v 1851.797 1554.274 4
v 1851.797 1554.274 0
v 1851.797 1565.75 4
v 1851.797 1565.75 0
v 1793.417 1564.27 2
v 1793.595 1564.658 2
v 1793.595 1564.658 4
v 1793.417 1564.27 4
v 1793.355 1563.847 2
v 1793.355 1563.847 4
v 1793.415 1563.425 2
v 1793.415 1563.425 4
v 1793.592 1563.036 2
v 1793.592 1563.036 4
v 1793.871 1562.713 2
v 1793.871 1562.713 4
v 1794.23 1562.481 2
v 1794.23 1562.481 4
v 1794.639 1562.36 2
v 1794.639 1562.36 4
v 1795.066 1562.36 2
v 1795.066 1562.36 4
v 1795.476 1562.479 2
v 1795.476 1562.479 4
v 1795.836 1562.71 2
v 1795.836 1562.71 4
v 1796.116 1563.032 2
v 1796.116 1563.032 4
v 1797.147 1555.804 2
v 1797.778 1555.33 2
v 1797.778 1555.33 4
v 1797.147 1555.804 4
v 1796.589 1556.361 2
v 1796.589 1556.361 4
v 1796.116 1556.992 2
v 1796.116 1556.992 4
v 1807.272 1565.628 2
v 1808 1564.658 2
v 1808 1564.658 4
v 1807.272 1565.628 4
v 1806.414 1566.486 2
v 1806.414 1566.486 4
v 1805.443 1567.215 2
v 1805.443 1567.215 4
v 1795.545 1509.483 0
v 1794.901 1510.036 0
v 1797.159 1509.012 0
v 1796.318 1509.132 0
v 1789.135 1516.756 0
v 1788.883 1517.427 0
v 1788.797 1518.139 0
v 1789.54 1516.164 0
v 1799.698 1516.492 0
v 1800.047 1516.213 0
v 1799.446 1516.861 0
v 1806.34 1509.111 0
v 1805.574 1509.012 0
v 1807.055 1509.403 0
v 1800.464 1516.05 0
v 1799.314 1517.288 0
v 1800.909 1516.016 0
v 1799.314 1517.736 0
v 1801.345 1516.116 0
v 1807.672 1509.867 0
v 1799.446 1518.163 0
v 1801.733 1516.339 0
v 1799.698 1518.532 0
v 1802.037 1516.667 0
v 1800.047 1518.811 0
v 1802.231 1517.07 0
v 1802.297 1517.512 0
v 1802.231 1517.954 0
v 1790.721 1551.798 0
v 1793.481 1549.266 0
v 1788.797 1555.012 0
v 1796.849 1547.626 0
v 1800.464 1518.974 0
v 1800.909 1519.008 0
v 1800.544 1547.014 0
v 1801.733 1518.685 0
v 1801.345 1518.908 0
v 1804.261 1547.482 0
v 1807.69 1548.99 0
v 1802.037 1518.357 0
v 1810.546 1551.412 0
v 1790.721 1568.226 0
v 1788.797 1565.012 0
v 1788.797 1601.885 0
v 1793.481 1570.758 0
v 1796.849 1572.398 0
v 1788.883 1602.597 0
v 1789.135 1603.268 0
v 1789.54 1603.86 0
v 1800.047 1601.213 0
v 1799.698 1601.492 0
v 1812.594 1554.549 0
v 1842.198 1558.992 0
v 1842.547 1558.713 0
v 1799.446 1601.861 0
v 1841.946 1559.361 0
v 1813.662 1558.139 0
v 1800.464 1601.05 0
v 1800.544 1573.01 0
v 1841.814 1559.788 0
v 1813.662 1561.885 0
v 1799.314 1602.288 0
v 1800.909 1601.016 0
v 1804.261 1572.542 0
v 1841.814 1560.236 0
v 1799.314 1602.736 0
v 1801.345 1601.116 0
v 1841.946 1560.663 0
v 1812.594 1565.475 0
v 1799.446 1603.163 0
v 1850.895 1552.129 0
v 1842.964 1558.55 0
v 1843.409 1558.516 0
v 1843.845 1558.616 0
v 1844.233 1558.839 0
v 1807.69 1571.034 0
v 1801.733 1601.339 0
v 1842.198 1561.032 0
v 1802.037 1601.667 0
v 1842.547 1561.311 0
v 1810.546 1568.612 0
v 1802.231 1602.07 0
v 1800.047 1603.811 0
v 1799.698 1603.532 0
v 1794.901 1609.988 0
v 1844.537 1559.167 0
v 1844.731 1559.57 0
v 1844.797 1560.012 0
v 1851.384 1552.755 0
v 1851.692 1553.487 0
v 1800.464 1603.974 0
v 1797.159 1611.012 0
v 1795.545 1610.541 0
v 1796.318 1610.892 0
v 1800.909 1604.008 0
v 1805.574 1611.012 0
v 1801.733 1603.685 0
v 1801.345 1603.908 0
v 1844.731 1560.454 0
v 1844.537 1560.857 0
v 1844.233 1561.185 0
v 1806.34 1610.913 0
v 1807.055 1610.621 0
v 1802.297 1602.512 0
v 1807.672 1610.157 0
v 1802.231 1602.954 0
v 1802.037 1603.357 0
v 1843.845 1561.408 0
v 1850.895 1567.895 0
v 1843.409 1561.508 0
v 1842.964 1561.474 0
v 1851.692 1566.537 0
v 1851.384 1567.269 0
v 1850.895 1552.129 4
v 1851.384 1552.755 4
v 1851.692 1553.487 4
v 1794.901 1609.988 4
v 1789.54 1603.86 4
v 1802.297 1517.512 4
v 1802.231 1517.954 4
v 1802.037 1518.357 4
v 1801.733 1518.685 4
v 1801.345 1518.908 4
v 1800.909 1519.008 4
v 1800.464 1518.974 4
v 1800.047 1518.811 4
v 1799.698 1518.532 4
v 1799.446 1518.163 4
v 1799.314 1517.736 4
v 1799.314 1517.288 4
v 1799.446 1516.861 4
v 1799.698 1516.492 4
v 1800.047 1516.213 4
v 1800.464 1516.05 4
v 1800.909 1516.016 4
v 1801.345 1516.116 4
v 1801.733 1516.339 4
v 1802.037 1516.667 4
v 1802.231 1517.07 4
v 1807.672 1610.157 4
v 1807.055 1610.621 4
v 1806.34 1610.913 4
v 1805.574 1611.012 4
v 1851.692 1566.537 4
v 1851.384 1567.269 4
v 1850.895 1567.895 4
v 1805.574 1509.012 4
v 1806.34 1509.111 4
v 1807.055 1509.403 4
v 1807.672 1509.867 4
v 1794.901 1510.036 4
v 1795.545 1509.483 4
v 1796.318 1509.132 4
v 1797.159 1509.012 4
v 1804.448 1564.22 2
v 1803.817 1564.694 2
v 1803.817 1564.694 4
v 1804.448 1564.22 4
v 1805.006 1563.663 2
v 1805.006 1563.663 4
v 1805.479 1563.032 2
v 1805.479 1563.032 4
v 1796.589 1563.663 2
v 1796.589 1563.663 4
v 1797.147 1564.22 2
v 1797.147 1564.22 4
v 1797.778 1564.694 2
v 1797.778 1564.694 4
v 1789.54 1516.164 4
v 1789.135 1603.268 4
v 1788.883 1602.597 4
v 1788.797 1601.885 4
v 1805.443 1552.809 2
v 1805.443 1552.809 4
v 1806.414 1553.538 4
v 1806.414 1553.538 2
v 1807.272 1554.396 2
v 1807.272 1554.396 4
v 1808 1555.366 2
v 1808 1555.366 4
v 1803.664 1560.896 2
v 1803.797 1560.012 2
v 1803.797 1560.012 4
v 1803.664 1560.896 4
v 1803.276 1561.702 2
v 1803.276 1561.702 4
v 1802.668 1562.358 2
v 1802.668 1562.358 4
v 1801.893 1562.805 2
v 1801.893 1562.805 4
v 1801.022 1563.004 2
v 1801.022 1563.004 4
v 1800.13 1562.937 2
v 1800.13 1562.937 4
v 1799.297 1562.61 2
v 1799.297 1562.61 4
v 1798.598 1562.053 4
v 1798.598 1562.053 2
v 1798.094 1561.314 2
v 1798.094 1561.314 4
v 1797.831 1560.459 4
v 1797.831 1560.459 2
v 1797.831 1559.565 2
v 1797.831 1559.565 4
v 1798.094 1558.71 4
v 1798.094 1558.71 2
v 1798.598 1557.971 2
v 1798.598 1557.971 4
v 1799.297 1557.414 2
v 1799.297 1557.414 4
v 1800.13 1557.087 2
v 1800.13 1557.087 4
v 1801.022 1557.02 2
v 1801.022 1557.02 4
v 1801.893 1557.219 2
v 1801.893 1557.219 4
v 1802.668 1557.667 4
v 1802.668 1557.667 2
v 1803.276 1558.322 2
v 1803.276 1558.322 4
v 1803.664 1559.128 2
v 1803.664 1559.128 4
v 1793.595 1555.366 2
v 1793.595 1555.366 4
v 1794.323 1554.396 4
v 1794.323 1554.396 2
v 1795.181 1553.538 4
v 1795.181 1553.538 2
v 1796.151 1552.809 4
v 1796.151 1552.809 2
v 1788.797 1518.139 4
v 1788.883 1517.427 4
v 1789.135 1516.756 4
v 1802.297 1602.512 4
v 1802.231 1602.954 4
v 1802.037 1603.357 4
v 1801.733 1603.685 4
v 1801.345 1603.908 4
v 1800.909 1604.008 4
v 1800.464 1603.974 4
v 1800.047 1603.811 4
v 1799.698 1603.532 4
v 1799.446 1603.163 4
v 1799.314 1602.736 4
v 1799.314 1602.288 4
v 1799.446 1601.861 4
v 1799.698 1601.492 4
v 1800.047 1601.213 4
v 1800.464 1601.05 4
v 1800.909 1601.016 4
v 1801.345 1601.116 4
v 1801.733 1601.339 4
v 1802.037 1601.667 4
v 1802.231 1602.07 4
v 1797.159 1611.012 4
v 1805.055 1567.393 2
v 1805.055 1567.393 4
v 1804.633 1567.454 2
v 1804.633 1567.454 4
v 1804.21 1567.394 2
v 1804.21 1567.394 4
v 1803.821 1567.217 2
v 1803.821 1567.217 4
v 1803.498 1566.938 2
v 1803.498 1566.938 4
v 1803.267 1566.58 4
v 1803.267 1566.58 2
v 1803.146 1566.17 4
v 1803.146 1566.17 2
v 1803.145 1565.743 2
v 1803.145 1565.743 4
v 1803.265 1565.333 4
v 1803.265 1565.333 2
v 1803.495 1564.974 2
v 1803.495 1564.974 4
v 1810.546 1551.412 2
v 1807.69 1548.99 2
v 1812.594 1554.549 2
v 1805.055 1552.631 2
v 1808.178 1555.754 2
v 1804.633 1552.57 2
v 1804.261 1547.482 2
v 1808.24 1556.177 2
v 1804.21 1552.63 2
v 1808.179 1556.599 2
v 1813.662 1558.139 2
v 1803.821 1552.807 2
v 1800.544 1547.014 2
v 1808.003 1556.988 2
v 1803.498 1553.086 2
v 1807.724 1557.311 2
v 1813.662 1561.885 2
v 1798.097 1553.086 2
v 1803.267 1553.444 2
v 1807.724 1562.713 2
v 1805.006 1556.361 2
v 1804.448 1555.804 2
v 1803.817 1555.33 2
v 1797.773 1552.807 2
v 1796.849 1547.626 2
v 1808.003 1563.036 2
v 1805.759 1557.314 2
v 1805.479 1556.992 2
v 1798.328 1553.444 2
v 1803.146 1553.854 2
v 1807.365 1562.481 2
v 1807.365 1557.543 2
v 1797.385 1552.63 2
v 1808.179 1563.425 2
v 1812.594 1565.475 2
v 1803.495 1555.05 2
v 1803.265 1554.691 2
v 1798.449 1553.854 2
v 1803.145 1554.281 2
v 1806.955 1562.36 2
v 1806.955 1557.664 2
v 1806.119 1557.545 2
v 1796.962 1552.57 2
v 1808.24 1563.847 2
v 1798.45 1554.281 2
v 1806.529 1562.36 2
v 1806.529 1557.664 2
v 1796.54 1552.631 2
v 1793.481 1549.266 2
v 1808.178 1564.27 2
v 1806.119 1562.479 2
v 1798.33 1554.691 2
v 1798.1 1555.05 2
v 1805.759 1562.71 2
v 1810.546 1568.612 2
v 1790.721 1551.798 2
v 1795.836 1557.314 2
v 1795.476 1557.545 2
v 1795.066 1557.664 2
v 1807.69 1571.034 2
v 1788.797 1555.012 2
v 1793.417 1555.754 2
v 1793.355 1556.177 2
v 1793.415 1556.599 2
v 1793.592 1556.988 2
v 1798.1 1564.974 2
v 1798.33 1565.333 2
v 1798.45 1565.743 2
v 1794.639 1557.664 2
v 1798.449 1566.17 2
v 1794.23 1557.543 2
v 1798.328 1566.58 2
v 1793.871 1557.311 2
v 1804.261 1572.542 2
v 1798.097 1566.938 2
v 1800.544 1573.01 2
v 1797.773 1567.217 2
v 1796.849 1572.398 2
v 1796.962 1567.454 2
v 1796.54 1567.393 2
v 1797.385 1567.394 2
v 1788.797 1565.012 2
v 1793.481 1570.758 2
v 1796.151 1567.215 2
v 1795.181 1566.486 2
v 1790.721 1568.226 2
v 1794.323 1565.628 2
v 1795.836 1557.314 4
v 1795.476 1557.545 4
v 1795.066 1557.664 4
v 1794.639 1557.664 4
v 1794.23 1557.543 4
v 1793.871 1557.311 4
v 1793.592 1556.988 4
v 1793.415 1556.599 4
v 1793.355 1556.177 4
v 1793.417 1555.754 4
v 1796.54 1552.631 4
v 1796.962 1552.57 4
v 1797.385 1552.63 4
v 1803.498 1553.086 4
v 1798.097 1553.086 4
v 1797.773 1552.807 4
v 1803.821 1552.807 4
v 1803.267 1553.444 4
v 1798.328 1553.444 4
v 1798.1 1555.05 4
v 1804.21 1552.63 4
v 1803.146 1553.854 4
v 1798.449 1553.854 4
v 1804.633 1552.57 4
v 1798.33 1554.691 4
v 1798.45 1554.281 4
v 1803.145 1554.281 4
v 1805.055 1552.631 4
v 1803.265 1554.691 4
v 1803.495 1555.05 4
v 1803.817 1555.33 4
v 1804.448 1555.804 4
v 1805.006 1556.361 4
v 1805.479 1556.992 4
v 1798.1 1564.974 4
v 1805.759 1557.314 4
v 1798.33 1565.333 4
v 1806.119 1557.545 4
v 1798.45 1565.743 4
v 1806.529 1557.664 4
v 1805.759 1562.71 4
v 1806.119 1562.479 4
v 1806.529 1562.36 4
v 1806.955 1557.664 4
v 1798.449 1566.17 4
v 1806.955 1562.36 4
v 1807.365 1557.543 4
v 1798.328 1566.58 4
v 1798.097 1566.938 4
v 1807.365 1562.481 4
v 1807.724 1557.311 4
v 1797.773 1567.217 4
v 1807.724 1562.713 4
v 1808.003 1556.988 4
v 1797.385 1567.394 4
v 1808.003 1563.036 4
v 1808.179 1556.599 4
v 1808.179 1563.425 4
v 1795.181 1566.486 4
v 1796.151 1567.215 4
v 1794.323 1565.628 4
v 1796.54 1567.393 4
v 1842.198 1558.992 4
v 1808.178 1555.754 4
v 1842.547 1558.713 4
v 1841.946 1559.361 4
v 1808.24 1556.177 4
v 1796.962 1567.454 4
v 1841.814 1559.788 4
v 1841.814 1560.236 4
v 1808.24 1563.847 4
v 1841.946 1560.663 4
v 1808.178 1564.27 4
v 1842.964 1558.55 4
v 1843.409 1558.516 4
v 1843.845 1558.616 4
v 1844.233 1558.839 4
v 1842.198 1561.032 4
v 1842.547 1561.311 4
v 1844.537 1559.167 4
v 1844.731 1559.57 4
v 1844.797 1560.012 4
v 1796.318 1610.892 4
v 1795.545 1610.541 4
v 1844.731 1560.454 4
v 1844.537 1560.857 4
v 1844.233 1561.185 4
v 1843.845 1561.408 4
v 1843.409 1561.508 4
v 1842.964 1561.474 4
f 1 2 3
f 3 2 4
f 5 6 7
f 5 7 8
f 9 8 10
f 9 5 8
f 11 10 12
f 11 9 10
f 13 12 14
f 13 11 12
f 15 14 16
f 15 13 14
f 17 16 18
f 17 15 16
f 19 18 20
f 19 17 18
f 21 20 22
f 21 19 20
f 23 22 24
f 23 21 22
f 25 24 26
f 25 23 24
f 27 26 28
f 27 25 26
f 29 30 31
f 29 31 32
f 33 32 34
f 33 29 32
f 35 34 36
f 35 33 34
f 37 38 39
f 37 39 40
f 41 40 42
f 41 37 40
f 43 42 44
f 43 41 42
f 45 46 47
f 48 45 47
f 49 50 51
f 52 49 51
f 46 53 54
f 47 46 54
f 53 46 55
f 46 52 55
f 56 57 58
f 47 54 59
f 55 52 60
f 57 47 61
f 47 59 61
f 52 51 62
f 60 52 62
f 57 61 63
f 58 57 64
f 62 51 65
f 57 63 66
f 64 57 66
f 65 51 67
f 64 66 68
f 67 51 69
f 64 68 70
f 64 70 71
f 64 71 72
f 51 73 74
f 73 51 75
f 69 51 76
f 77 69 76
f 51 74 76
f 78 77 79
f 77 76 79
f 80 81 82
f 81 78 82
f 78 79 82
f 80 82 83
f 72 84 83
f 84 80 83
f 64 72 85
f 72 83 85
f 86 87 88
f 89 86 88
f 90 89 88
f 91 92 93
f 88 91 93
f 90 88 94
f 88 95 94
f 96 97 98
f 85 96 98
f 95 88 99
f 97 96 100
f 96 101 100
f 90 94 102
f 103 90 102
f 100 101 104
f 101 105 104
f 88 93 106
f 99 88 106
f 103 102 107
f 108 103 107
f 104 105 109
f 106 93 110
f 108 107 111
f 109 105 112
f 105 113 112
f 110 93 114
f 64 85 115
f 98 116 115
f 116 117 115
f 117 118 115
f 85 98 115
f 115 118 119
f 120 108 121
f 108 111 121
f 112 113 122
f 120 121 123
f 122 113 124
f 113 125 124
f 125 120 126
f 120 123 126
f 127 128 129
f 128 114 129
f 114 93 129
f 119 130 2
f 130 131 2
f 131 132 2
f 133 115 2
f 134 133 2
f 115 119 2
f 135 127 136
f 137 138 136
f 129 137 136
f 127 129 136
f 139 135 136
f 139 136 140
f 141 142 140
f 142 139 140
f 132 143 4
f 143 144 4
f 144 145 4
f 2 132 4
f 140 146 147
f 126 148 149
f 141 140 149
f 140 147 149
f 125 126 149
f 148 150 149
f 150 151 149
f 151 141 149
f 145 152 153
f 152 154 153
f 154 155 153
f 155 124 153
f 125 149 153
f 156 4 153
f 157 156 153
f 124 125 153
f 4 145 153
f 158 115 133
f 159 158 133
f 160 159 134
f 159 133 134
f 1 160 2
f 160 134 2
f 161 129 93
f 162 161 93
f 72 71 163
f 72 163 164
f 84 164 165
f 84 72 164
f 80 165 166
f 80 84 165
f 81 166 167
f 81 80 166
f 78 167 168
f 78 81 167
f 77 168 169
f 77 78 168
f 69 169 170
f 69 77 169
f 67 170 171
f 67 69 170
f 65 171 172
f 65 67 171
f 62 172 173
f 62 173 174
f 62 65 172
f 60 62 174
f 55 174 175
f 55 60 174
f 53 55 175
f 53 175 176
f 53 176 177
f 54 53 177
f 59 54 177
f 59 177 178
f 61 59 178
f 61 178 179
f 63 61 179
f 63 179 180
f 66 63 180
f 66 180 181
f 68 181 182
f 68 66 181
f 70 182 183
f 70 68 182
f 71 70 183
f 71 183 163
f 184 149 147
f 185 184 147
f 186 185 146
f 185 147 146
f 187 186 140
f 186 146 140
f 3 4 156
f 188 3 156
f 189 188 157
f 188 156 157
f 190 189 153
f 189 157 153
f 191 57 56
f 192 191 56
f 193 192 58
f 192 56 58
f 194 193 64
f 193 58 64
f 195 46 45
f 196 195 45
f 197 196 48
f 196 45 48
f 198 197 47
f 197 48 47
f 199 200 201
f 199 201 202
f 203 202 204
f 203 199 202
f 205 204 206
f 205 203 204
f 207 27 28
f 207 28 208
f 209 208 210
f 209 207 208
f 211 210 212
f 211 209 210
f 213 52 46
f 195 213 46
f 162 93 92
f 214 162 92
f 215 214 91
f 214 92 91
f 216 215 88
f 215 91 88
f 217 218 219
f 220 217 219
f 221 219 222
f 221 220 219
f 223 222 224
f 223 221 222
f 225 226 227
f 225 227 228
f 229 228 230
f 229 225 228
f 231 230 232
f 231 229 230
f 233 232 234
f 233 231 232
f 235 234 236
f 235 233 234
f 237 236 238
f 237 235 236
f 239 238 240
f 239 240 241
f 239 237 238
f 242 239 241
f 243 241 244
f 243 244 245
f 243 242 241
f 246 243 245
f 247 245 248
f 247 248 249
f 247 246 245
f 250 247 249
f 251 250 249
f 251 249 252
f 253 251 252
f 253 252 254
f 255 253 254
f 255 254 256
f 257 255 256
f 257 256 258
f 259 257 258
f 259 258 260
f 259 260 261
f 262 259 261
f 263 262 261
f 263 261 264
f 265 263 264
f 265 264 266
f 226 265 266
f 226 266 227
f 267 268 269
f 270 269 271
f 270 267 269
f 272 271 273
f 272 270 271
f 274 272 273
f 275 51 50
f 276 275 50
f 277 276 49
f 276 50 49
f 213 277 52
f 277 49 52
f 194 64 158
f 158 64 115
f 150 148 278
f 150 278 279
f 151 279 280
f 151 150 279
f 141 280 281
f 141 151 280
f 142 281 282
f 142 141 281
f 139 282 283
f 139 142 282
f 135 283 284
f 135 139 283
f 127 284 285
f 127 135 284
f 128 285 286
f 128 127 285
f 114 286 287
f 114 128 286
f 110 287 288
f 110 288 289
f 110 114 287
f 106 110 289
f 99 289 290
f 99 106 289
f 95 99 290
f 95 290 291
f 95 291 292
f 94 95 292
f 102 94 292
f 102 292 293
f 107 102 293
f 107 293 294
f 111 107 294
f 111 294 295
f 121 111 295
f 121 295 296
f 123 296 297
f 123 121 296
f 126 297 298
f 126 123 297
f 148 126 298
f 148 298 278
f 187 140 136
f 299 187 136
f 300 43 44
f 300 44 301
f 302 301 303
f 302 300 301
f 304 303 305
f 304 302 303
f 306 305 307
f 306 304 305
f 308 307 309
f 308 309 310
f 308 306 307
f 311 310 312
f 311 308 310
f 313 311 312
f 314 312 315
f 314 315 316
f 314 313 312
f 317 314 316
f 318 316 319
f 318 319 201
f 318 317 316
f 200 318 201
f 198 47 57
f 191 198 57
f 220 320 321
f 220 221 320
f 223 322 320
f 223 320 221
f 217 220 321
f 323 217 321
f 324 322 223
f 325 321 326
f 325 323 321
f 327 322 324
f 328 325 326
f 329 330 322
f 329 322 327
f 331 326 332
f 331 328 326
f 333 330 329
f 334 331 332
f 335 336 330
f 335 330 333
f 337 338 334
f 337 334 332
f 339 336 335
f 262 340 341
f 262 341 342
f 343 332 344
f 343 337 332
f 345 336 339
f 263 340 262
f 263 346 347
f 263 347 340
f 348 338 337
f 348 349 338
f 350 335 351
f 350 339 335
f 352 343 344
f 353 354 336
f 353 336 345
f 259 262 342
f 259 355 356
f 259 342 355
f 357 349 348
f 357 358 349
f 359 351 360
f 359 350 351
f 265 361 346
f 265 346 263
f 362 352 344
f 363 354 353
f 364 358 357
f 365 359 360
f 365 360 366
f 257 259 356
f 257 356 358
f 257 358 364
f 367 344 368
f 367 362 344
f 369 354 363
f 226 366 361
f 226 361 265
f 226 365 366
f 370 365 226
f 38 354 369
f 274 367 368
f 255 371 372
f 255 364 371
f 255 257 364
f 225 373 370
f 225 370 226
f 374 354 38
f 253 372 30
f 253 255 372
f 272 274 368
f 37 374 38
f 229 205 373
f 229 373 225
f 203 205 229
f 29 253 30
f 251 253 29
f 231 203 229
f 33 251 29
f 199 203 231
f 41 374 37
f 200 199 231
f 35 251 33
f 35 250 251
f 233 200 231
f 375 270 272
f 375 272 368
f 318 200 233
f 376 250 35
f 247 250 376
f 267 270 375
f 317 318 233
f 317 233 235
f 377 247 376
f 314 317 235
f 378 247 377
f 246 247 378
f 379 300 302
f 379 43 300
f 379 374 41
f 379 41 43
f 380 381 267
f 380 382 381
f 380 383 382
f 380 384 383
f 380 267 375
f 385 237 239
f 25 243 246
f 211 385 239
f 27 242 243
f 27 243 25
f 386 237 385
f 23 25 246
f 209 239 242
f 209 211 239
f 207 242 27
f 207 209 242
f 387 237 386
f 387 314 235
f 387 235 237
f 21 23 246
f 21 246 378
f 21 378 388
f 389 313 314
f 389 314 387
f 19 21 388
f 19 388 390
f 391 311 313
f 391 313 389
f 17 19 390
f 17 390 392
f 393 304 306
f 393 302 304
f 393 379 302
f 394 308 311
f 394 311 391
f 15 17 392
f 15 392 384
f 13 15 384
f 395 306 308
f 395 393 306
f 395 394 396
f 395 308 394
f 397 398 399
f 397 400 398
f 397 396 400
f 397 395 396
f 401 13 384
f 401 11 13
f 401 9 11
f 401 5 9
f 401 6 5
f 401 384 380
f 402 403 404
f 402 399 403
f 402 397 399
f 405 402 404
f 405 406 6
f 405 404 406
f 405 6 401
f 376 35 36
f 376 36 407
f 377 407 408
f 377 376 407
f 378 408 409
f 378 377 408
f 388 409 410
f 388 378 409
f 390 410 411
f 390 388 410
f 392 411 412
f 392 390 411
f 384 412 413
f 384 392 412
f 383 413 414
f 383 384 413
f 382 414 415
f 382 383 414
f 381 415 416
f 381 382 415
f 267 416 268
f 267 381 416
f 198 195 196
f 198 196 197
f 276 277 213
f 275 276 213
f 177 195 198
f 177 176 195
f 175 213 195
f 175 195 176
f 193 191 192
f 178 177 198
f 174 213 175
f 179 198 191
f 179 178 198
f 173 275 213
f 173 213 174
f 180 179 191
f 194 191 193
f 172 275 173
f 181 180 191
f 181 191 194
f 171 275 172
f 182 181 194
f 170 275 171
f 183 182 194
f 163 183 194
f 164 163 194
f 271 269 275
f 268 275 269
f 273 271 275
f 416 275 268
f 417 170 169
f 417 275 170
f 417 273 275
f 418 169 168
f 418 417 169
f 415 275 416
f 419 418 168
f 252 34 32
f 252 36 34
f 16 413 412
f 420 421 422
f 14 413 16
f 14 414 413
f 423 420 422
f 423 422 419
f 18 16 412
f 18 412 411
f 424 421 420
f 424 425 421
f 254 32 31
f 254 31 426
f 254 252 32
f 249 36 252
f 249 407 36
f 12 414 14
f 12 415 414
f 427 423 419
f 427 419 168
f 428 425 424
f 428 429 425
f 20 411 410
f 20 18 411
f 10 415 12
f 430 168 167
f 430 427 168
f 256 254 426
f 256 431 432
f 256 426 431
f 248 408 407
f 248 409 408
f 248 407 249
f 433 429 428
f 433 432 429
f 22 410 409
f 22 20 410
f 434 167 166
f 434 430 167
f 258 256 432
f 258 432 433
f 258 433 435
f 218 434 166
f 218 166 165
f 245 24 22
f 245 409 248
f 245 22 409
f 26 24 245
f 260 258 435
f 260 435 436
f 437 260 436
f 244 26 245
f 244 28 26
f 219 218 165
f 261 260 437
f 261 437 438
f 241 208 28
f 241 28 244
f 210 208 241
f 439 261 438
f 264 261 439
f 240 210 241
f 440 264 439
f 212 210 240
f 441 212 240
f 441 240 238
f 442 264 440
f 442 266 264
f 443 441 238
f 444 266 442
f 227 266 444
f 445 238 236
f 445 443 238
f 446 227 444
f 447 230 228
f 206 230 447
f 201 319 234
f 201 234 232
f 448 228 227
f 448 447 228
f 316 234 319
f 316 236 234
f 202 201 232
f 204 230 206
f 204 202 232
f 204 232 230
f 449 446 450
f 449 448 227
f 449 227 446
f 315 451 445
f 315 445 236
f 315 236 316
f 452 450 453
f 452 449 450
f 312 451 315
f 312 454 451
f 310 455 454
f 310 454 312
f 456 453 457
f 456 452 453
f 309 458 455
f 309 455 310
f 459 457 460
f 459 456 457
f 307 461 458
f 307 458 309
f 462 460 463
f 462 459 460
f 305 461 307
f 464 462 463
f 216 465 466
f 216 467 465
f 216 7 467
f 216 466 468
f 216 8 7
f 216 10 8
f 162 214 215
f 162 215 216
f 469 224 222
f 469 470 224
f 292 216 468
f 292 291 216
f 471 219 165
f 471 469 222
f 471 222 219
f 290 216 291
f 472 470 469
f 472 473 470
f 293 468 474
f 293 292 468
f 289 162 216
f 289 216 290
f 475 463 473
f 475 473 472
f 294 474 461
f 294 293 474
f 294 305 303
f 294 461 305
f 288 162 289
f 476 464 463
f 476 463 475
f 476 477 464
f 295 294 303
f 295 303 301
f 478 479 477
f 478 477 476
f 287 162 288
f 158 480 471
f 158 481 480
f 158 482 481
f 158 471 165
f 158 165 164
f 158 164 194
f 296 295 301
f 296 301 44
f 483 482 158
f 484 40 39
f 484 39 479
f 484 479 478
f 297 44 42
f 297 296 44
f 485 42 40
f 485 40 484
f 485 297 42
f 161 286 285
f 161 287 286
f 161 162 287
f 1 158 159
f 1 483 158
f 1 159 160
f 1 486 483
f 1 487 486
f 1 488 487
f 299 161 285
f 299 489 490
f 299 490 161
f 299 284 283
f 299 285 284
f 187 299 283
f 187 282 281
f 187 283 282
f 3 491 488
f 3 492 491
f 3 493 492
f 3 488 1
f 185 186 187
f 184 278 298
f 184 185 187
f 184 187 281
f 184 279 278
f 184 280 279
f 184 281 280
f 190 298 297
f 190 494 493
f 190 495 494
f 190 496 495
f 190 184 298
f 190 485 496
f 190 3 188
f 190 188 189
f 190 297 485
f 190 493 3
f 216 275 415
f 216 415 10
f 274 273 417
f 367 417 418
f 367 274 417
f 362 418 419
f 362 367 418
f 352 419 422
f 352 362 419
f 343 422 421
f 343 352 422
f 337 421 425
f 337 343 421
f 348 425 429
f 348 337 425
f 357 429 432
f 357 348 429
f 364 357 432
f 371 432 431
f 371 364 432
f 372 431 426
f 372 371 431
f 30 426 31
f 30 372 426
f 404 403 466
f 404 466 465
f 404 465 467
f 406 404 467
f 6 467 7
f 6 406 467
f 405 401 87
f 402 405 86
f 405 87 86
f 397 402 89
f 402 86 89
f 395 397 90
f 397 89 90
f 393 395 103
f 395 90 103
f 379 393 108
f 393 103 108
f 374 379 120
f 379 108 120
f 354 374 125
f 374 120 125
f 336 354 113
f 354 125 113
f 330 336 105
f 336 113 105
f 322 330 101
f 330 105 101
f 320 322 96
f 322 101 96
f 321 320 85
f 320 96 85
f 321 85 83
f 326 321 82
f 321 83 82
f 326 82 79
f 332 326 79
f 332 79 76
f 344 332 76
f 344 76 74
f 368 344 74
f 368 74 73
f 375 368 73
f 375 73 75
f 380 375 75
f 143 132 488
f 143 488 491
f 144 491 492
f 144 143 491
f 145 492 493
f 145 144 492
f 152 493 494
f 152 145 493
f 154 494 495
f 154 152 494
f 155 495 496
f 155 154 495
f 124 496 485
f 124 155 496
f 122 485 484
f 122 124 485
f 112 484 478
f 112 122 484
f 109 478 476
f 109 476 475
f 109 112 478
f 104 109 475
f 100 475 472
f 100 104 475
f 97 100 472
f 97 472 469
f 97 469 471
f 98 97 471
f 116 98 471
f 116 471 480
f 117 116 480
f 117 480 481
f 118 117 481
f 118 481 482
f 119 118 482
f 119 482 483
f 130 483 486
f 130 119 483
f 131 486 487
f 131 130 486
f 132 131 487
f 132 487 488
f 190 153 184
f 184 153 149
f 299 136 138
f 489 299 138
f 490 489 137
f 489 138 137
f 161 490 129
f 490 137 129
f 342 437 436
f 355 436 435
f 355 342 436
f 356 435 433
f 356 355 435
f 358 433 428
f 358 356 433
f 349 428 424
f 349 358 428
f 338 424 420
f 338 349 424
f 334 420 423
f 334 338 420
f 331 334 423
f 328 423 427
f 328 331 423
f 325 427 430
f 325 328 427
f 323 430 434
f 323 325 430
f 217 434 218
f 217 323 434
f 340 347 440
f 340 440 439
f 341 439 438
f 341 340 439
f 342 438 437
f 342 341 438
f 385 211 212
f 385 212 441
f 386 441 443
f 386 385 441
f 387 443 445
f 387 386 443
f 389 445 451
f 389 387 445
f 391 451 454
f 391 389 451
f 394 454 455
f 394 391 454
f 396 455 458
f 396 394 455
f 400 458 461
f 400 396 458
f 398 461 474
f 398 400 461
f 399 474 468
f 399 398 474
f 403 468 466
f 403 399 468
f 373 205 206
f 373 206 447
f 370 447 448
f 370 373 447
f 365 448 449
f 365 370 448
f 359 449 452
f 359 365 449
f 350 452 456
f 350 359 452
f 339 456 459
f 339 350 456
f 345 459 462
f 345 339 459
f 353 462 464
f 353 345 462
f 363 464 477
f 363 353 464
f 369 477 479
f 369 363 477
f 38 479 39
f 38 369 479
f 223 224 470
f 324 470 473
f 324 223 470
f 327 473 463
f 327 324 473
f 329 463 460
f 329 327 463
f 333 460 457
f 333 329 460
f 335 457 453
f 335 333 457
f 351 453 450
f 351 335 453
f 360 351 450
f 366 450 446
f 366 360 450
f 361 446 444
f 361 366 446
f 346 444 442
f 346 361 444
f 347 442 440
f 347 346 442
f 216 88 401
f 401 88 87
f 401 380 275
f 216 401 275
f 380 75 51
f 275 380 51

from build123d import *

# Parameters (mm, degrees)
SKETCH_1_R          = 3
SKETCH_1_R_2        = 1.5
EXTRUDE_1_DEPTH     = 4
SKETCH_3_R          = 13
CUT_EXTRUDE_2_DEPTH = 2


with BuildPart() as part:
    # 草图1 → 凸台-拉伸1 (new body)
    with BuildSketch(Plane.XY):
        with BuildLine():
            Line((1789.5396377, 1516.163703518), (1794.90094238, 1510.03649817))
            ThreePointArc((1794.90094238, 1510.03649817), (1795.919023617, 1509.280113251), (1797.158672464, 1509.012011993))
            Line((1797.158672464, 1509.012011993), (1805.574426245, 1509.012011993))
            ThreePointArc((1805.574426245, 1509.012011993), (1806.70688816, 1509.233967715), (1807.671779141, 1509.866991986))
            Line((1807.671779141, 1509.866991986), (1850.89472068, 1552.129423713))
            ThreePointArc((1850.89472068, 1552.129423713), (1851.562513231, 1553.110841273), (1851.797367784, 1554.274443721))
            Line((1851.797367784, 1554.274443721), (1851.797367784, 1565.749580266))
            ThreePointArc((1851.797367784, 1565.749580266), (1851.562513231, 1566.913182714), (1850.89472068, 1567.894600273))
            Line((1850.89472068, 1567.894600273), (1807.671779141, 1610.157032))
            ThreePointArc((1807.671779141, 1610.157032), (1806.70688816, 1610.790056271), (1805.574426245, 1611.012011993))
            Line((1805.574426245, 1611.012011993), (1797.158672464, 1611.012011993))
            ThreePointArc((1797.158672464, 1611.012011993), (1795.919023617, 1610.743910735), (1794.90094238, 1609.987525817))
            Line((1794.90094238, 1609.987525817), (1789.5396377, 1603.860320468))
            ThreePointArc((1789.5396377, 1603.860320468), (1788.989059552, 1602.939986664), (1788.797367784, 1601.884806645))
            Line((1788.797367784, 1601.884806645), (1788.797367784, 1518.139217341))
            ThreePointArc((1788.797367784, 1518.139217341), (1788.989059552, 1517.084037322), (1789.5396377, 1516.163703518))
        make_face()
        with Locations((1800.797367784, 1560.012011993)):
            Circle(SKETCH_1_R, mode=Mode.SUBTRACT)
        with Locations((1800.797367784, 1602.512011993)):
            Circle(SKETCH_1_R_2, mode=Mode.SUBTRACT)
        with Locations((1843.297367784, 1560.012011993)):
            Circle(SKETCH_1_R_2, mode=Mode.SUBTRACT)
        with Locations((1800.797367784, 1517.512011993)):
            Circle(SKETCH_1_R_2, mode=Mode.SUBTRACT)
        with BuildLine():
            ThreePointArc((1805.443255224, 1552.809308797), (1806.858027956, 1553.951351821), (1808.000070981, 1555.366124554))
            ThreePointArc((1808.000070981, 1555.366124554), (1807.55260939, 1557.43971519), (1805.479018754, 1556.992253599))
            ThreePointArc((1805.479018754, 1556.992253599), (1804.736707613, 1556.072672165), (1803.817126178, 1555.330361023))
            ThreePointArc((1803.817126178, 1555.330361023), (1803.369664588, 1553.256770387), (1805.443255224, 1552.809308797))
        make_face(mode=Mode.SUBTRACT)
        with BuildLine():
            ThreePointArc((1808.000070981, 1564.657899433), (1806.858027956, 1566.072672165), (1805.443255224, 1567.21471519))
            ThreePointArc((1805.443255224, 1567.21471519), (1803.369664588, 1566.767253599), (1803.817126178, 1564.693662963))
            ThreePointArc((1803.817126178, 1564.693662963), (1804.736707613, 1563.951351821), (1805.479018754, 1563.031770387))
            ThreePointArc((1805.479018754, 1563.031770387), (1807.55260939, 1562.584308797), (1808.000070981, 1564.657899433))
        make_face(mode=Mode.SUBTRACT)
        with BuildLine():
            ThreePointArc((1796.151480345, 1567.21471519), (1794.736707613, 1566.072672165), (1793.594664588, 1564.657899433))
            ThreePointArc((1793.594664588, 1564.657899433), (1794.042126178, 1562.584308797), (1796.115716814, 1563.031770387))
            ThreePointArc((1796.115716814, 1563.031770387), (1796.858027956, 1563.951351821), (1797.77760939, 1564.693662963))
            ThreePointArc((1797.77760939, 1564.693662963), (1798.225070981, 1566.767253599), (1796.151480345, 1567.21471519))
        make_face(mode=Mode.SUBTRACT)
        with BuildLine():
            ThreePointArc((1793.594664588, 1555.366124554), (1794.736707613, 1553.951351821), (1796.151480345, 1552.809308797))
            ThreePointArc((1796.151480345, 1552.809308797), (1798.225070981, 1553.256770387), (1797.77760939, 1555.330361023))
            ThreePointArc((1797.77760939, 1555.330361023), (1796.858027956, 1556.072672165), (1796.115716814, 1556.992253599))
            ThreePointArc((1796.115716814, 1556.992253599), (1794.042126178, 1557.43971519), (1793.594664588, 1555.366124554))
        make_face(mode=Mode.SUBTRACT)
    extrude(amount=EXTRUDE_1_DEPTH)

    # 草图3 → 切除-拉伸2 (cut)
    with BuildSketch(Plane(origin=(0, 0, 0), x_dir=(-1, 0, 0), z_dir=(0, 0, -1))):
        with Locations((-1800.797367784, 1560.012011993)):
            Circle(SKETCH_3_R)
    extrude(amount=-CUT_EXTRUDE_2_DEPTH, mode=Mode.SUBTRACT)


solid = part.part
